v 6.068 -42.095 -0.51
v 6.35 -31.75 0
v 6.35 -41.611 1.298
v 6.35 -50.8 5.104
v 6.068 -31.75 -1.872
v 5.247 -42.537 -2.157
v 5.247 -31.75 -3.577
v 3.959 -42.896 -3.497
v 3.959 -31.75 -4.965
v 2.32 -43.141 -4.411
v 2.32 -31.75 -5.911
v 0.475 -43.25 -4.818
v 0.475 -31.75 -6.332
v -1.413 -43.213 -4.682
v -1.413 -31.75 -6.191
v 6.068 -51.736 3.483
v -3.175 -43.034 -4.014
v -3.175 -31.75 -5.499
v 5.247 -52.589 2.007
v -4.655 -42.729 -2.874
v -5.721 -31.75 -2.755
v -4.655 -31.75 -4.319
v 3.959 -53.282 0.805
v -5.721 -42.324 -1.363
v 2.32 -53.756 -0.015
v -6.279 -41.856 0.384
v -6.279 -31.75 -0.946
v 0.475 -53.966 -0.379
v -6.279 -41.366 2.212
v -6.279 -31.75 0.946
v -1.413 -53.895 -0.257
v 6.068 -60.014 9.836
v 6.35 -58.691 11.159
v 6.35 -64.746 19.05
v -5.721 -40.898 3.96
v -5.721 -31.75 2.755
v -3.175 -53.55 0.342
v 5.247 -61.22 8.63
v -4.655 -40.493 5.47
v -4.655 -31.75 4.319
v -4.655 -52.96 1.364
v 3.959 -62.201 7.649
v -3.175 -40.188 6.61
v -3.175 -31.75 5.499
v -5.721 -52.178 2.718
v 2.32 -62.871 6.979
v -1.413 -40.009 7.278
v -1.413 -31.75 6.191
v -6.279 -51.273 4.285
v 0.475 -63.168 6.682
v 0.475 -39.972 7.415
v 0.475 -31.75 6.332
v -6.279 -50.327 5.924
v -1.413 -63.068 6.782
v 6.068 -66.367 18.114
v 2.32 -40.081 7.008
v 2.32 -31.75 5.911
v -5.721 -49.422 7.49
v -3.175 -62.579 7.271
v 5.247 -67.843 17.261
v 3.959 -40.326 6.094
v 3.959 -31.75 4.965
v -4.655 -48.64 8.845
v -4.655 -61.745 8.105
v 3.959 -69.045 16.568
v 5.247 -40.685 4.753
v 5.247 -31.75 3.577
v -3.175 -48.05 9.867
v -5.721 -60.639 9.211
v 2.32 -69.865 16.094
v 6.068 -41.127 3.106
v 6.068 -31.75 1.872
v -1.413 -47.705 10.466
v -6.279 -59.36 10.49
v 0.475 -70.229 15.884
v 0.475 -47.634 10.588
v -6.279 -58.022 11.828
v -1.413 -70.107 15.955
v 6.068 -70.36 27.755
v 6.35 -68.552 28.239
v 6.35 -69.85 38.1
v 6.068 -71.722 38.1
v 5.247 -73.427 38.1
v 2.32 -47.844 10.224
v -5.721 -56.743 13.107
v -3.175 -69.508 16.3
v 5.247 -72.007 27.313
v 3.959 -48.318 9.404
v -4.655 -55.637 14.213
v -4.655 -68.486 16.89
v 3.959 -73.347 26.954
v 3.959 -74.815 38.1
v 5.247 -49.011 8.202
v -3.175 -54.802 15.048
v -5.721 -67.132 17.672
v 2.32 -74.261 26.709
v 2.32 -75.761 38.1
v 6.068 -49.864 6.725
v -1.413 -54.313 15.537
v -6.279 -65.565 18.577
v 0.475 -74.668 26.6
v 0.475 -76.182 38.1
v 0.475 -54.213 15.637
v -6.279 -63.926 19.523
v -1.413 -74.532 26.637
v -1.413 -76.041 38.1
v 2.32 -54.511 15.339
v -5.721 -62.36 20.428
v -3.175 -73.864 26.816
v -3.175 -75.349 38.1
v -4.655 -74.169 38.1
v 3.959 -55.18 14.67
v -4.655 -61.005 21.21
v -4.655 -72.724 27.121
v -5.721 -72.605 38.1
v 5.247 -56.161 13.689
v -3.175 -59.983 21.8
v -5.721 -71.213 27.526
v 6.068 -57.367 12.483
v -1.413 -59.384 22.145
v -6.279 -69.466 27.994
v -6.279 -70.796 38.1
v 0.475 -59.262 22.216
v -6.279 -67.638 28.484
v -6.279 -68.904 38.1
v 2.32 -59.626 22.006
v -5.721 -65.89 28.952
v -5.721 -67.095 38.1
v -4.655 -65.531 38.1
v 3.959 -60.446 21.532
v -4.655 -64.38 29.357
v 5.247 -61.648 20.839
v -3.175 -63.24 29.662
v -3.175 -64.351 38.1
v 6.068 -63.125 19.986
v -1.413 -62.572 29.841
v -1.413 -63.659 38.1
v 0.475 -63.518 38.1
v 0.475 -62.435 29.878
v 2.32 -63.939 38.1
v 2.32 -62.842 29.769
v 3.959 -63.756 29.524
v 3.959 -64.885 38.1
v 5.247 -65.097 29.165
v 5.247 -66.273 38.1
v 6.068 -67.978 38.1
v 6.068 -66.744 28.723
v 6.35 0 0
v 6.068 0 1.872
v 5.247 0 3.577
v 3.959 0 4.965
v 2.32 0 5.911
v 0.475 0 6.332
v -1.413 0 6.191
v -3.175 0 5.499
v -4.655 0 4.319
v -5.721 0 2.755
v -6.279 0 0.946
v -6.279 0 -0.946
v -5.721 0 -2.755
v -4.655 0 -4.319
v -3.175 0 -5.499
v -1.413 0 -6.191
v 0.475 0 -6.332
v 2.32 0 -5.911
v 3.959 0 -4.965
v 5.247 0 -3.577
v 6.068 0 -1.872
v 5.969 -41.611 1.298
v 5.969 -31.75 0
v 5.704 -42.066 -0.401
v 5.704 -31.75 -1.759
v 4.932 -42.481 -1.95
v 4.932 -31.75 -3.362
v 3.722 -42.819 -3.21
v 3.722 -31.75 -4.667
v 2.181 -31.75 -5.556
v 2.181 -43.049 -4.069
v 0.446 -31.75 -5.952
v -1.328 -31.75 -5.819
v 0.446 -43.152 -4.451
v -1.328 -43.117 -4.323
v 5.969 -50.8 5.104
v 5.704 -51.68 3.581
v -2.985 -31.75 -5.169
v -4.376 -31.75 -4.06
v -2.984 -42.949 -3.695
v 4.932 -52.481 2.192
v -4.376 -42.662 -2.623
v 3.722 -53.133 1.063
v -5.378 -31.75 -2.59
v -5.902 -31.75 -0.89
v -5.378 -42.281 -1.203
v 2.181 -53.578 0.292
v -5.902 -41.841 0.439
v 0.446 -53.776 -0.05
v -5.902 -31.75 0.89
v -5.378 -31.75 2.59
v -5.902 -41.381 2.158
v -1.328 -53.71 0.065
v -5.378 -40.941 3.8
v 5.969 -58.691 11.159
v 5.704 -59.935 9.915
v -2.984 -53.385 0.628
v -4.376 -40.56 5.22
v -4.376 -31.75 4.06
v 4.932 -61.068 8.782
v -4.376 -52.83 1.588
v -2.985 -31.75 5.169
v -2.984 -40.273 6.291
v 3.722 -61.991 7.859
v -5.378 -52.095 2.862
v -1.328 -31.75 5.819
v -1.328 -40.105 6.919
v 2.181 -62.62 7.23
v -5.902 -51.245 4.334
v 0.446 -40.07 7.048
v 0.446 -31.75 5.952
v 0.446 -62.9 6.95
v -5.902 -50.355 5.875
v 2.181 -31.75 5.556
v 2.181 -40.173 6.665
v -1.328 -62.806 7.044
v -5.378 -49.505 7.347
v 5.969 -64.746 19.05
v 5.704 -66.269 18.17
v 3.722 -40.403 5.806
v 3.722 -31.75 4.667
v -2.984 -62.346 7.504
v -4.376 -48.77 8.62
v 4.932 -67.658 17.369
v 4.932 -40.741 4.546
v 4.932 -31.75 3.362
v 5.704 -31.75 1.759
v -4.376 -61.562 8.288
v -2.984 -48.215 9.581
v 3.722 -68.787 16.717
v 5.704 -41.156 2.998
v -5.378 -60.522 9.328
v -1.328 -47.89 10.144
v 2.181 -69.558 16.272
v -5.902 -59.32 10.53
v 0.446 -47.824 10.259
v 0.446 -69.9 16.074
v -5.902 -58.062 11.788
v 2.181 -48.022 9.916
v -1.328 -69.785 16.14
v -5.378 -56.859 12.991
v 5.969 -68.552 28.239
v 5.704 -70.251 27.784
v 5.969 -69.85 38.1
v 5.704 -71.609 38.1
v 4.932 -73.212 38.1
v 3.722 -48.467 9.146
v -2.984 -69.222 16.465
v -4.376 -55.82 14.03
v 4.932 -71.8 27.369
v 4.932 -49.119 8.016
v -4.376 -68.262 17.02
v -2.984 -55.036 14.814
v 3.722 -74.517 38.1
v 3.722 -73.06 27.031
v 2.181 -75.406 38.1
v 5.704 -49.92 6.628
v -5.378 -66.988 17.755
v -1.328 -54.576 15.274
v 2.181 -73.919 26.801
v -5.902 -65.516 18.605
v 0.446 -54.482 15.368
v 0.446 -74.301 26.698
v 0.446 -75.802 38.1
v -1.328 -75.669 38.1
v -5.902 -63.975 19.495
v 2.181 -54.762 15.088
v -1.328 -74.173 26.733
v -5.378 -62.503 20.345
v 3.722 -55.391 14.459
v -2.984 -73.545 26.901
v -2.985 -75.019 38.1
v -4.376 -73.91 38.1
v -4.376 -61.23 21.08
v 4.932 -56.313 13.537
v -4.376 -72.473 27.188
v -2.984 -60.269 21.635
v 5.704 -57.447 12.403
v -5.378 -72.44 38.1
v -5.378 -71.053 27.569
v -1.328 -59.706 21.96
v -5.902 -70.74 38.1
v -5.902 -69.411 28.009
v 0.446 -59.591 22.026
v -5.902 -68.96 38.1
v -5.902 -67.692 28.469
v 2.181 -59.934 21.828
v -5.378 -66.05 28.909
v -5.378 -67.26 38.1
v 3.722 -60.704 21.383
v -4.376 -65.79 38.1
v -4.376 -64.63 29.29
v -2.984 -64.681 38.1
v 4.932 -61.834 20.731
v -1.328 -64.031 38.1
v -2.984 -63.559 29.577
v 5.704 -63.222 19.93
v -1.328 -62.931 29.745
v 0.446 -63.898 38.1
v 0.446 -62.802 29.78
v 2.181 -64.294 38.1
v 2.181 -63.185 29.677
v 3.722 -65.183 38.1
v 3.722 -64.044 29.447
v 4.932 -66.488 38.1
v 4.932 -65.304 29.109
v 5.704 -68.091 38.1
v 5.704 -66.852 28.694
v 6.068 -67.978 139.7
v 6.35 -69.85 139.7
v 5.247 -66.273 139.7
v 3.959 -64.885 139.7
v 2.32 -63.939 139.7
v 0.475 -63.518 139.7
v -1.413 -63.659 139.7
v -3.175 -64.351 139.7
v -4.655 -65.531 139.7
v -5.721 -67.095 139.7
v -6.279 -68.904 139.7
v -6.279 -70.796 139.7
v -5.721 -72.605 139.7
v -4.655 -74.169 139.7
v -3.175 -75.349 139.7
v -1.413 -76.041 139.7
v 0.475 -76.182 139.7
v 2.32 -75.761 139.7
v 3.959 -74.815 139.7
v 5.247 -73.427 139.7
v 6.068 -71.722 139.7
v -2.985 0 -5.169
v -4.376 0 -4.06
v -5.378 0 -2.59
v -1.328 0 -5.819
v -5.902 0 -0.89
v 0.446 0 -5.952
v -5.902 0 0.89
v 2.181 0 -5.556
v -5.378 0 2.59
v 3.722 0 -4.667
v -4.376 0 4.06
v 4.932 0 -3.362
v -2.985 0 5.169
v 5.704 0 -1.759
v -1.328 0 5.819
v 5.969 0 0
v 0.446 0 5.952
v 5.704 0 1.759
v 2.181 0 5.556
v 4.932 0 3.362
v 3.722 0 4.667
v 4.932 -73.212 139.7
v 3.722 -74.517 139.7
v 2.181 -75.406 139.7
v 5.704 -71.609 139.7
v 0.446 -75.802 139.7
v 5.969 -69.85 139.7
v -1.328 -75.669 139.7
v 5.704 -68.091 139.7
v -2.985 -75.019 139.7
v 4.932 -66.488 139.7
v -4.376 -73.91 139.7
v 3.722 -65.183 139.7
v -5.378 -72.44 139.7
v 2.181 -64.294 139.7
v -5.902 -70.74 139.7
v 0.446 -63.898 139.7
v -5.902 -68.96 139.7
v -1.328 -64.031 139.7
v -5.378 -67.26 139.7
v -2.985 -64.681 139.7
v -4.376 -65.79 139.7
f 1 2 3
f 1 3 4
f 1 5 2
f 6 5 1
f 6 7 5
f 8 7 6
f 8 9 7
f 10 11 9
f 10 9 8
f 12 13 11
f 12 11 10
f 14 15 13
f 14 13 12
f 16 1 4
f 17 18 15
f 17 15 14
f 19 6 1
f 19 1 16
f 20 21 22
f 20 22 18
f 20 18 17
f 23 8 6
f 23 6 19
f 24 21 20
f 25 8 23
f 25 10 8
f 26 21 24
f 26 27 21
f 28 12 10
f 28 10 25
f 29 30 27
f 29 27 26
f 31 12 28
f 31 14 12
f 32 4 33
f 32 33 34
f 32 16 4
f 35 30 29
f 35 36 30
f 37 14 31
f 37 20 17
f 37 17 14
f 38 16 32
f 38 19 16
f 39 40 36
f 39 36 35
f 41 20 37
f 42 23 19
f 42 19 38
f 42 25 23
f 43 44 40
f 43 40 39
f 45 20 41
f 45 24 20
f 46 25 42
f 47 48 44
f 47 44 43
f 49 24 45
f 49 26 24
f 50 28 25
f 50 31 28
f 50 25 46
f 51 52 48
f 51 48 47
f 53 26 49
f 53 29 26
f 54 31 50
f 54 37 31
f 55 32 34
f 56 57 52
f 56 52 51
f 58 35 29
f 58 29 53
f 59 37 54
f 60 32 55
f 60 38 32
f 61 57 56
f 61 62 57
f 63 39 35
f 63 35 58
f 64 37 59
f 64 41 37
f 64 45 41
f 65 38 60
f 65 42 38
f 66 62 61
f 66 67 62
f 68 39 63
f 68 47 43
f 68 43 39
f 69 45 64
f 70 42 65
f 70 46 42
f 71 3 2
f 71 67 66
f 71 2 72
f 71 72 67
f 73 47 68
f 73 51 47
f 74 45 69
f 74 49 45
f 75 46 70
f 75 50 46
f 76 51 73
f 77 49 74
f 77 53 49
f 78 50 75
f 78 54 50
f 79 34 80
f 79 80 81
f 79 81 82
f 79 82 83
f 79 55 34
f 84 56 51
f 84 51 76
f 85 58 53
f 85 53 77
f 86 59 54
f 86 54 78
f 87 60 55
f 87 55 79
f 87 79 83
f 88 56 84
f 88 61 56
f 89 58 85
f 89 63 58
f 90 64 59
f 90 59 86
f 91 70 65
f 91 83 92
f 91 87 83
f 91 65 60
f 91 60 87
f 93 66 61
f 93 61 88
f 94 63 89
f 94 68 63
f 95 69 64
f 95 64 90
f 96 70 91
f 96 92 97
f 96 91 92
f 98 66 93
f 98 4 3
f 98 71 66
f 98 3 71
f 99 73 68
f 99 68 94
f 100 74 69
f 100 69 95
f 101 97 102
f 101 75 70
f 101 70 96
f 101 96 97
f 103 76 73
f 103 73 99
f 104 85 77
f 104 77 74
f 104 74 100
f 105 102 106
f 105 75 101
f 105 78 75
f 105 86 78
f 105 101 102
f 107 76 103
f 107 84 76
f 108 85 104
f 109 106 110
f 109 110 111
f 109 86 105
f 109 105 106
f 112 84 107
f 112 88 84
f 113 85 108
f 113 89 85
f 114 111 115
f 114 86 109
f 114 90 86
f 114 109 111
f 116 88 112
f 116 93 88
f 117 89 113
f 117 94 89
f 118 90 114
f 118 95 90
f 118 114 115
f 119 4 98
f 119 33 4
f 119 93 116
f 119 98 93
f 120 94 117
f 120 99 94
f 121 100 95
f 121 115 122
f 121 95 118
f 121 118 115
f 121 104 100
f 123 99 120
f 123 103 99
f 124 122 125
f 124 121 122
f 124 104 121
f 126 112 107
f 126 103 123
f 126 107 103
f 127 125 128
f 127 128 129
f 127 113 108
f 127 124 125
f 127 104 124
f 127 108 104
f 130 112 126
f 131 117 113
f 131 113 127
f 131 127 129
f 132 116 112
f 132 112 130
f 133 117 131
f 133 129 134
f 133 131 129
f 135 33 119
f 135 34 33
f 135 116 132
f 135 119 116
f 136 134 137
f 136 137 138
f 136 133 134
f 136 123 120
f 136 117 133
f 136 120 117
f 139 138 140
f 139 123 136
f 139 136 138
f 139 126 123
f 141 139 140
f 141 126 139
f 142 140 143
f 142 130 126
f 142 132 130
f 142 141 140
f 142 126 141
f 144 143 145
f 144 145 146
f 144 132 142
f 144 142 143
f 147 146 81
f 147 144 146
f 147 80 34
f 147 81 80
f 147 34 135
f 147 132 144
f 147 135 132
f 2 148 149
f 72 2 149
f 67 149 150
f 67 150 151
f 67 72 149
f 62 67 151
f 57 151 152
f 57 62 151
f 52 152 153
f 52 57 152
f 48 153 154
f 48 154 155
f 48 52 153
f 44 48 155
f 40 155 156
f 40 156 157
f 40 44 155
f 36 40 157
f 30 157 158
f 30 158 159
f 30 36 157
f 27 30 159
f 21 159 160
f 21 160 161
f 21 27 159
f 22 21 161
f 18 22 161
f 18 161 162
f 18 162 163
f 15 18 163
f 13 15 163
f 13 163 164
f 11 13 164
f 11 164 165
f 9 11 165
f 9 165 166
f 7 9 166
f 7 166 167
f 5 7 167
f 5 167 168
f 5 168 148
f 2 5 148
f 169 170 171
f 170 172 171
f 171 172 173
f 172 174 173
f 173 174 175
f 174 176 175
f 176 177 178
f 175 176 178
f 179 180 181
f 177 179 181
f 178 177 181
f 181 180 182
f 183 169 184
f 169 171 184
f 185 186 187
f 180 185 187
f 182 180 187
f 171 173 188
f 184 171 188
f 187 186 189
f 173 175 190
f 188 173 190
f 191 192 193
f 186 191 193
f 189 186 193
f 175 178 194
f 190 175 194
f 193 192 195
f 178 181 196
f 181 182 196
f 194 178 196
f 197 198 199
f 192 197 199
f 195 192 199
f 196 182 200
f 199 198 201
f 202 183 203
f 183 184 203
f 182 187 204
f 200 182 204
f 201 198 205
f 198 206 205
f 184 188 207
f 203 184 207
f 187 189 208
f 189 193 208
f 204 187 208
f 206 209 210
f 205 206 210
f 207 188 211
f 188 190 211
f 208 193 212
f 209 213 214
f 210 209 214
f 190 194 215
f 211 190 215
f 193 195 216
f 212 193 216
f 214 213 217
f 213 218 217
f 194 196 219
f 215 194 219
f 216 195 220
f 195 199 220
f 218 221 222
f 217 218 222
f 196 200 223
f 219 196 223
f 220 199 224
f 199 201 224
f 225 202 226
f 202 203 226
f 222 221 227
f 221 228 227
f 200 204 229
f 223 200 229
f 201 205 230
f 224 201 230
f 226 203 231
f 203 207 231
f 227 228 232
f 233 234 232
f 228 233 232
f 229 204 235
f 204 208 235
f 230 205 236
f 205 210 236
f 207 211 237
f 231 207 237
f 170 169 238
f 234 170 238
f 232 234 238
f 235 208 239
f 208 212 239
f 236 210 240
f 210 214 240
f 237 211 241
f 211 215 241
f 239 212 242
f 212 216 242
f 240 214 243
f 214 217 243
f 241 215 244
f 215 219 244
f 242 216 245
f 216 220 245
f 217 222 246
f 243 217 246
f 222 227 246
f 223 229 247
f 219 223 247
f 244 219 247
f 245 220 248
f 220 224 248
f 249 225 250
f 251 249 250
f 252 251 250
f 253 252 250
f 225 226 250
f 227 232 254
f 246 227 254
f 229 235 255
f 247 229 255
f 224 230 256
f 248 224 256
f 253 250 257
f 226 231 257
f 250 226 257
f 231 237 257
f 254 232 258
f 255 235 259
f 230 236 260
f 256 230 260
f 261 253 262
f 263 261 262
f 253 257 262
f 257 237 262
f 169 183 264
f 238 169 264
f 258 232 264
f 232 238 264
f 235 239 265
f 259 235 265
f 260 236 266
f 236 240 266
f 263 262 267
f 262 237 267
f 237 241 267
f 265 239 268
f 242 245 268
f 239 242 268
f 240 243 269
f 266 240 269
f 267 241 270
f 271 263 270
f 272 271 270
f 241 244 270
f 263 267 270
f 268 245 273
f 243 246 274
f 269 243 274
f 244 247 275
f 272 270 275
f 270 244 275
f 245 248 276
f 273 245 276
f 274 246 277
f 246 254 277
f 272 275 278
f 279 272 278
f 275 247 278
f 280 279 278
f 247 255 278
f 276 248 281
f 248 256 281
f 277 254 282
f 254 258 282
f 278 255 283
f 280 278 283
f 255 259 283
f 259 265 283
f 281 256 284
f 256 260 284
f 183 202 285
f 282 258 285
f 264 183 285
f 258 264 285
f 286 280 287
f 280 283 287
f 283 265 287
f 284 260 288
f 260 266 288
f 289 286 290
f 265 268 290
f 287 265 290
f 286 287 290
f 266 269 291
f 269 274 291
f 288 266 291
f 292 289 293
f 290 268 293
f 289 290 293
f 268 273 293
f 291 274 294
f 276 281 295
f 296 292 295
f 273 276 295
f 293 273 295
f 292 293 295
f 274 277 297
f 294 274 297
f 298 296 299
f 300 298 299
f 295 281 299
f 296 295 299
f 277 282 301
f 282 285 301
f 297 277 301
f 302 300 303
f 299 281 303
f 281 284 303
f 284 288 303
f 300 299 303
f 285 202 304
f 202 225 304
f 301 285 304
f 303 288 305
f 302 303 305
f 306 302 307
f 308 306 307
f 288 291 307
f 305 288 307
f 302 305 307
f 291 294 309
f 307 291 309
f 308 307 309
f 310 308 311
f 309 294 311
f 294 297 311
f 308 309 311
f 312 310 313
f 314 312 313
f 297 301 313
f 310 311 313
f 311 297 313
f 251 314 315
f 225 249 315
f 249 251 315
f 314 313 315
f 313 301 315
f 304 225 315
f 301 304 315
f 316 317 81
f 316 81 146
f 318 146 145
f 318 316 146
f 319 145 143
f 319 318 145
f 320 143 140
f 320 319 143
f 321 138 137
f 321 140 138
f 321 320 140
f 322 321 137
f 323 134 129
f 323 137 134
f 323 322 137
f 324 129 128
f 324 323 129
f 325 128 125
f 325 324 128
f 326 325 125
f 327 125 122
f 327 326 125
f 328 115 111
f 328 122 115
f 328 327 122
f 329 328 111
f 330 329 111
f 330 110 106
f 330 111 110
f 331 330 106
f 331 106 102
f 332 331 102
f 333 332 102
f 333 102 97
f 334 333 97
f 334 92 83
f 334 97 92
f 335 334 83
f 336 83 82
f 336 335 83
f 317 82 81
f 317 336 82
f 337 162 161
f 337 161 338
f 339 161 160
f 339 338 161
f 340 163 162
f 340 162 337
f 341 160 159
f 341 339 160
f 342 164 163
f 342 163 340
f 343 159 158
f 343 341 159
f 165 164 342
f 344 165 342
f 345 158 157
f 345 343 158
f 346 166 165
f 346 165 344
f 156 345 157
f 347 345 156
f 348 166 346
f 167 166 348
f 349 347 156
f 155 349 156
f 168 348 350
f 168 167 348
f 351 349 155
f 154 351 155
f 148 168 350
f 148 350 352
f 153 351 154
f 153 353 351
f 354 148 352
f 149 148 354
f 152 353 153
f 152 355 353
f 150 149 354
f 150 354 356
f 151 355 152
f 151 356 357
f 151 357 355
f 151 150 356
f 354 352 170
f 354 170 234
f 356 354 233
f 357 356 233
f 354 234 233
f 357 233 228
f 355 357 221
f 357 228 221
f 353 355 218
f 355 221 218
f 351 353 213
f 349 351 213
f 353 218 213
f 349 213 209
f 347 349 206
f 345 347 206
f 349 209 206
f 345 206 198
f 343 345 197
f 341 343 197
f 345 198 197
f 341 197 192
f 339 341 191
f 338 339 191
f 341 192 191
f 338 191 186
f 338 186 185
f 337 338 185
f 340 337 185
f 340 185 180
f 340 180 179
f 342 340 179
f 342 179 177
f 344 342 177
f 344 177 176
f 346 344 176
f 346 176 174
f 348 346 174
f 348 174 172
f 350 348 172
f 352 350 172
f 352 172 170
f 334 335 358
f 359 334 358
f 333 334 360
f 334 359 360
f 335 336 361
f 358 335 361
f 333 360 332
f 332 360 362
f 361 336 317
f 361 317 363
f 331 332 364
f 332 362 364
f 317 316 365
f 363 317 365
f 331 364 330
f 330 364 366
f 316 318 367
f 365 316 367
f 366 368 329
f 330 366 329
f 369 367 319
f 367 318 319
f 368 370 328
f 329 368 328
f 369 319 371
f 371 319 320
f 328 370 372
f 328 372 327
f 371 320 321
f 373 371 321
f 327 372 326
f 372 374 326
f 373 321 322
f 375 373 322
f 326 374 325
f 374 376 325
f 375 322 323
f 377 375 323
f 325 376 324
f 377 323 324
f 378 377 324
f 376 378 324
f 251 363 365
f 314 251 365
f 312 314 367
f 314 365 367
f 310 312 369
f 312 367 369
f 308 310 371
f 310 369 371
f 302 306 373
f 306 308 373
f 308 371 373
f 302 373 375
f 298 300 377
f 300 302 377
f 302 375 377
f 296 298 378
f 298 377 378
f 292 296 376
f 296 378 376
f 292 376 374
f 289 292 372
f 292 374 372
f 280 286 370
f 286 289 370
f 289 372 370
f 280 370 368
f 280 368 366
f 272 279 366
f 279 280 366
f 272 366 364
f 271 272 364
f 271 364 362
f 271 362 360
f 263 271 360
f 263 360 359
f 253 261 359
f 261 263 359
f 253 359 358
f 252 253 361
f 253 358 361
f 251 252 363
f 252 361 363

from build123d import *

# Parameters (mm, degrees)
SKETCH1_R   = 6.35
SKETCH1_R_2 = 5.969


with BuildPart() as part:
    # Sweep1: sweep along a path in Sketch2
    with BuildLine(Plane(origin=(0, 0, 0), x_dir=(0, 0, -1), z_dir=(1, 0, 0))) as sweep1_path:
        Line((0, 0), (0, -31.75))
        ThreePointArc((0, -31.75), (-11.159231637, -58.690768363), (-38.1, -69.85))
        Line((-38.1, -69.85), (-139.7, -69.85))
    # Sketch1 → Sweep1 (sweep)
    with BuildSketch(Plane(origin=(0, 0, 0), x_dir=(1, 0, 0), z_dir=(0, 1, 0))):
        Circle(SKETCH1_R)
        Circle(SKETCH1_R_2, mode=Mode.SUBTRACT)
    sweep(path=sweep1_path.line)


solid = part.part
